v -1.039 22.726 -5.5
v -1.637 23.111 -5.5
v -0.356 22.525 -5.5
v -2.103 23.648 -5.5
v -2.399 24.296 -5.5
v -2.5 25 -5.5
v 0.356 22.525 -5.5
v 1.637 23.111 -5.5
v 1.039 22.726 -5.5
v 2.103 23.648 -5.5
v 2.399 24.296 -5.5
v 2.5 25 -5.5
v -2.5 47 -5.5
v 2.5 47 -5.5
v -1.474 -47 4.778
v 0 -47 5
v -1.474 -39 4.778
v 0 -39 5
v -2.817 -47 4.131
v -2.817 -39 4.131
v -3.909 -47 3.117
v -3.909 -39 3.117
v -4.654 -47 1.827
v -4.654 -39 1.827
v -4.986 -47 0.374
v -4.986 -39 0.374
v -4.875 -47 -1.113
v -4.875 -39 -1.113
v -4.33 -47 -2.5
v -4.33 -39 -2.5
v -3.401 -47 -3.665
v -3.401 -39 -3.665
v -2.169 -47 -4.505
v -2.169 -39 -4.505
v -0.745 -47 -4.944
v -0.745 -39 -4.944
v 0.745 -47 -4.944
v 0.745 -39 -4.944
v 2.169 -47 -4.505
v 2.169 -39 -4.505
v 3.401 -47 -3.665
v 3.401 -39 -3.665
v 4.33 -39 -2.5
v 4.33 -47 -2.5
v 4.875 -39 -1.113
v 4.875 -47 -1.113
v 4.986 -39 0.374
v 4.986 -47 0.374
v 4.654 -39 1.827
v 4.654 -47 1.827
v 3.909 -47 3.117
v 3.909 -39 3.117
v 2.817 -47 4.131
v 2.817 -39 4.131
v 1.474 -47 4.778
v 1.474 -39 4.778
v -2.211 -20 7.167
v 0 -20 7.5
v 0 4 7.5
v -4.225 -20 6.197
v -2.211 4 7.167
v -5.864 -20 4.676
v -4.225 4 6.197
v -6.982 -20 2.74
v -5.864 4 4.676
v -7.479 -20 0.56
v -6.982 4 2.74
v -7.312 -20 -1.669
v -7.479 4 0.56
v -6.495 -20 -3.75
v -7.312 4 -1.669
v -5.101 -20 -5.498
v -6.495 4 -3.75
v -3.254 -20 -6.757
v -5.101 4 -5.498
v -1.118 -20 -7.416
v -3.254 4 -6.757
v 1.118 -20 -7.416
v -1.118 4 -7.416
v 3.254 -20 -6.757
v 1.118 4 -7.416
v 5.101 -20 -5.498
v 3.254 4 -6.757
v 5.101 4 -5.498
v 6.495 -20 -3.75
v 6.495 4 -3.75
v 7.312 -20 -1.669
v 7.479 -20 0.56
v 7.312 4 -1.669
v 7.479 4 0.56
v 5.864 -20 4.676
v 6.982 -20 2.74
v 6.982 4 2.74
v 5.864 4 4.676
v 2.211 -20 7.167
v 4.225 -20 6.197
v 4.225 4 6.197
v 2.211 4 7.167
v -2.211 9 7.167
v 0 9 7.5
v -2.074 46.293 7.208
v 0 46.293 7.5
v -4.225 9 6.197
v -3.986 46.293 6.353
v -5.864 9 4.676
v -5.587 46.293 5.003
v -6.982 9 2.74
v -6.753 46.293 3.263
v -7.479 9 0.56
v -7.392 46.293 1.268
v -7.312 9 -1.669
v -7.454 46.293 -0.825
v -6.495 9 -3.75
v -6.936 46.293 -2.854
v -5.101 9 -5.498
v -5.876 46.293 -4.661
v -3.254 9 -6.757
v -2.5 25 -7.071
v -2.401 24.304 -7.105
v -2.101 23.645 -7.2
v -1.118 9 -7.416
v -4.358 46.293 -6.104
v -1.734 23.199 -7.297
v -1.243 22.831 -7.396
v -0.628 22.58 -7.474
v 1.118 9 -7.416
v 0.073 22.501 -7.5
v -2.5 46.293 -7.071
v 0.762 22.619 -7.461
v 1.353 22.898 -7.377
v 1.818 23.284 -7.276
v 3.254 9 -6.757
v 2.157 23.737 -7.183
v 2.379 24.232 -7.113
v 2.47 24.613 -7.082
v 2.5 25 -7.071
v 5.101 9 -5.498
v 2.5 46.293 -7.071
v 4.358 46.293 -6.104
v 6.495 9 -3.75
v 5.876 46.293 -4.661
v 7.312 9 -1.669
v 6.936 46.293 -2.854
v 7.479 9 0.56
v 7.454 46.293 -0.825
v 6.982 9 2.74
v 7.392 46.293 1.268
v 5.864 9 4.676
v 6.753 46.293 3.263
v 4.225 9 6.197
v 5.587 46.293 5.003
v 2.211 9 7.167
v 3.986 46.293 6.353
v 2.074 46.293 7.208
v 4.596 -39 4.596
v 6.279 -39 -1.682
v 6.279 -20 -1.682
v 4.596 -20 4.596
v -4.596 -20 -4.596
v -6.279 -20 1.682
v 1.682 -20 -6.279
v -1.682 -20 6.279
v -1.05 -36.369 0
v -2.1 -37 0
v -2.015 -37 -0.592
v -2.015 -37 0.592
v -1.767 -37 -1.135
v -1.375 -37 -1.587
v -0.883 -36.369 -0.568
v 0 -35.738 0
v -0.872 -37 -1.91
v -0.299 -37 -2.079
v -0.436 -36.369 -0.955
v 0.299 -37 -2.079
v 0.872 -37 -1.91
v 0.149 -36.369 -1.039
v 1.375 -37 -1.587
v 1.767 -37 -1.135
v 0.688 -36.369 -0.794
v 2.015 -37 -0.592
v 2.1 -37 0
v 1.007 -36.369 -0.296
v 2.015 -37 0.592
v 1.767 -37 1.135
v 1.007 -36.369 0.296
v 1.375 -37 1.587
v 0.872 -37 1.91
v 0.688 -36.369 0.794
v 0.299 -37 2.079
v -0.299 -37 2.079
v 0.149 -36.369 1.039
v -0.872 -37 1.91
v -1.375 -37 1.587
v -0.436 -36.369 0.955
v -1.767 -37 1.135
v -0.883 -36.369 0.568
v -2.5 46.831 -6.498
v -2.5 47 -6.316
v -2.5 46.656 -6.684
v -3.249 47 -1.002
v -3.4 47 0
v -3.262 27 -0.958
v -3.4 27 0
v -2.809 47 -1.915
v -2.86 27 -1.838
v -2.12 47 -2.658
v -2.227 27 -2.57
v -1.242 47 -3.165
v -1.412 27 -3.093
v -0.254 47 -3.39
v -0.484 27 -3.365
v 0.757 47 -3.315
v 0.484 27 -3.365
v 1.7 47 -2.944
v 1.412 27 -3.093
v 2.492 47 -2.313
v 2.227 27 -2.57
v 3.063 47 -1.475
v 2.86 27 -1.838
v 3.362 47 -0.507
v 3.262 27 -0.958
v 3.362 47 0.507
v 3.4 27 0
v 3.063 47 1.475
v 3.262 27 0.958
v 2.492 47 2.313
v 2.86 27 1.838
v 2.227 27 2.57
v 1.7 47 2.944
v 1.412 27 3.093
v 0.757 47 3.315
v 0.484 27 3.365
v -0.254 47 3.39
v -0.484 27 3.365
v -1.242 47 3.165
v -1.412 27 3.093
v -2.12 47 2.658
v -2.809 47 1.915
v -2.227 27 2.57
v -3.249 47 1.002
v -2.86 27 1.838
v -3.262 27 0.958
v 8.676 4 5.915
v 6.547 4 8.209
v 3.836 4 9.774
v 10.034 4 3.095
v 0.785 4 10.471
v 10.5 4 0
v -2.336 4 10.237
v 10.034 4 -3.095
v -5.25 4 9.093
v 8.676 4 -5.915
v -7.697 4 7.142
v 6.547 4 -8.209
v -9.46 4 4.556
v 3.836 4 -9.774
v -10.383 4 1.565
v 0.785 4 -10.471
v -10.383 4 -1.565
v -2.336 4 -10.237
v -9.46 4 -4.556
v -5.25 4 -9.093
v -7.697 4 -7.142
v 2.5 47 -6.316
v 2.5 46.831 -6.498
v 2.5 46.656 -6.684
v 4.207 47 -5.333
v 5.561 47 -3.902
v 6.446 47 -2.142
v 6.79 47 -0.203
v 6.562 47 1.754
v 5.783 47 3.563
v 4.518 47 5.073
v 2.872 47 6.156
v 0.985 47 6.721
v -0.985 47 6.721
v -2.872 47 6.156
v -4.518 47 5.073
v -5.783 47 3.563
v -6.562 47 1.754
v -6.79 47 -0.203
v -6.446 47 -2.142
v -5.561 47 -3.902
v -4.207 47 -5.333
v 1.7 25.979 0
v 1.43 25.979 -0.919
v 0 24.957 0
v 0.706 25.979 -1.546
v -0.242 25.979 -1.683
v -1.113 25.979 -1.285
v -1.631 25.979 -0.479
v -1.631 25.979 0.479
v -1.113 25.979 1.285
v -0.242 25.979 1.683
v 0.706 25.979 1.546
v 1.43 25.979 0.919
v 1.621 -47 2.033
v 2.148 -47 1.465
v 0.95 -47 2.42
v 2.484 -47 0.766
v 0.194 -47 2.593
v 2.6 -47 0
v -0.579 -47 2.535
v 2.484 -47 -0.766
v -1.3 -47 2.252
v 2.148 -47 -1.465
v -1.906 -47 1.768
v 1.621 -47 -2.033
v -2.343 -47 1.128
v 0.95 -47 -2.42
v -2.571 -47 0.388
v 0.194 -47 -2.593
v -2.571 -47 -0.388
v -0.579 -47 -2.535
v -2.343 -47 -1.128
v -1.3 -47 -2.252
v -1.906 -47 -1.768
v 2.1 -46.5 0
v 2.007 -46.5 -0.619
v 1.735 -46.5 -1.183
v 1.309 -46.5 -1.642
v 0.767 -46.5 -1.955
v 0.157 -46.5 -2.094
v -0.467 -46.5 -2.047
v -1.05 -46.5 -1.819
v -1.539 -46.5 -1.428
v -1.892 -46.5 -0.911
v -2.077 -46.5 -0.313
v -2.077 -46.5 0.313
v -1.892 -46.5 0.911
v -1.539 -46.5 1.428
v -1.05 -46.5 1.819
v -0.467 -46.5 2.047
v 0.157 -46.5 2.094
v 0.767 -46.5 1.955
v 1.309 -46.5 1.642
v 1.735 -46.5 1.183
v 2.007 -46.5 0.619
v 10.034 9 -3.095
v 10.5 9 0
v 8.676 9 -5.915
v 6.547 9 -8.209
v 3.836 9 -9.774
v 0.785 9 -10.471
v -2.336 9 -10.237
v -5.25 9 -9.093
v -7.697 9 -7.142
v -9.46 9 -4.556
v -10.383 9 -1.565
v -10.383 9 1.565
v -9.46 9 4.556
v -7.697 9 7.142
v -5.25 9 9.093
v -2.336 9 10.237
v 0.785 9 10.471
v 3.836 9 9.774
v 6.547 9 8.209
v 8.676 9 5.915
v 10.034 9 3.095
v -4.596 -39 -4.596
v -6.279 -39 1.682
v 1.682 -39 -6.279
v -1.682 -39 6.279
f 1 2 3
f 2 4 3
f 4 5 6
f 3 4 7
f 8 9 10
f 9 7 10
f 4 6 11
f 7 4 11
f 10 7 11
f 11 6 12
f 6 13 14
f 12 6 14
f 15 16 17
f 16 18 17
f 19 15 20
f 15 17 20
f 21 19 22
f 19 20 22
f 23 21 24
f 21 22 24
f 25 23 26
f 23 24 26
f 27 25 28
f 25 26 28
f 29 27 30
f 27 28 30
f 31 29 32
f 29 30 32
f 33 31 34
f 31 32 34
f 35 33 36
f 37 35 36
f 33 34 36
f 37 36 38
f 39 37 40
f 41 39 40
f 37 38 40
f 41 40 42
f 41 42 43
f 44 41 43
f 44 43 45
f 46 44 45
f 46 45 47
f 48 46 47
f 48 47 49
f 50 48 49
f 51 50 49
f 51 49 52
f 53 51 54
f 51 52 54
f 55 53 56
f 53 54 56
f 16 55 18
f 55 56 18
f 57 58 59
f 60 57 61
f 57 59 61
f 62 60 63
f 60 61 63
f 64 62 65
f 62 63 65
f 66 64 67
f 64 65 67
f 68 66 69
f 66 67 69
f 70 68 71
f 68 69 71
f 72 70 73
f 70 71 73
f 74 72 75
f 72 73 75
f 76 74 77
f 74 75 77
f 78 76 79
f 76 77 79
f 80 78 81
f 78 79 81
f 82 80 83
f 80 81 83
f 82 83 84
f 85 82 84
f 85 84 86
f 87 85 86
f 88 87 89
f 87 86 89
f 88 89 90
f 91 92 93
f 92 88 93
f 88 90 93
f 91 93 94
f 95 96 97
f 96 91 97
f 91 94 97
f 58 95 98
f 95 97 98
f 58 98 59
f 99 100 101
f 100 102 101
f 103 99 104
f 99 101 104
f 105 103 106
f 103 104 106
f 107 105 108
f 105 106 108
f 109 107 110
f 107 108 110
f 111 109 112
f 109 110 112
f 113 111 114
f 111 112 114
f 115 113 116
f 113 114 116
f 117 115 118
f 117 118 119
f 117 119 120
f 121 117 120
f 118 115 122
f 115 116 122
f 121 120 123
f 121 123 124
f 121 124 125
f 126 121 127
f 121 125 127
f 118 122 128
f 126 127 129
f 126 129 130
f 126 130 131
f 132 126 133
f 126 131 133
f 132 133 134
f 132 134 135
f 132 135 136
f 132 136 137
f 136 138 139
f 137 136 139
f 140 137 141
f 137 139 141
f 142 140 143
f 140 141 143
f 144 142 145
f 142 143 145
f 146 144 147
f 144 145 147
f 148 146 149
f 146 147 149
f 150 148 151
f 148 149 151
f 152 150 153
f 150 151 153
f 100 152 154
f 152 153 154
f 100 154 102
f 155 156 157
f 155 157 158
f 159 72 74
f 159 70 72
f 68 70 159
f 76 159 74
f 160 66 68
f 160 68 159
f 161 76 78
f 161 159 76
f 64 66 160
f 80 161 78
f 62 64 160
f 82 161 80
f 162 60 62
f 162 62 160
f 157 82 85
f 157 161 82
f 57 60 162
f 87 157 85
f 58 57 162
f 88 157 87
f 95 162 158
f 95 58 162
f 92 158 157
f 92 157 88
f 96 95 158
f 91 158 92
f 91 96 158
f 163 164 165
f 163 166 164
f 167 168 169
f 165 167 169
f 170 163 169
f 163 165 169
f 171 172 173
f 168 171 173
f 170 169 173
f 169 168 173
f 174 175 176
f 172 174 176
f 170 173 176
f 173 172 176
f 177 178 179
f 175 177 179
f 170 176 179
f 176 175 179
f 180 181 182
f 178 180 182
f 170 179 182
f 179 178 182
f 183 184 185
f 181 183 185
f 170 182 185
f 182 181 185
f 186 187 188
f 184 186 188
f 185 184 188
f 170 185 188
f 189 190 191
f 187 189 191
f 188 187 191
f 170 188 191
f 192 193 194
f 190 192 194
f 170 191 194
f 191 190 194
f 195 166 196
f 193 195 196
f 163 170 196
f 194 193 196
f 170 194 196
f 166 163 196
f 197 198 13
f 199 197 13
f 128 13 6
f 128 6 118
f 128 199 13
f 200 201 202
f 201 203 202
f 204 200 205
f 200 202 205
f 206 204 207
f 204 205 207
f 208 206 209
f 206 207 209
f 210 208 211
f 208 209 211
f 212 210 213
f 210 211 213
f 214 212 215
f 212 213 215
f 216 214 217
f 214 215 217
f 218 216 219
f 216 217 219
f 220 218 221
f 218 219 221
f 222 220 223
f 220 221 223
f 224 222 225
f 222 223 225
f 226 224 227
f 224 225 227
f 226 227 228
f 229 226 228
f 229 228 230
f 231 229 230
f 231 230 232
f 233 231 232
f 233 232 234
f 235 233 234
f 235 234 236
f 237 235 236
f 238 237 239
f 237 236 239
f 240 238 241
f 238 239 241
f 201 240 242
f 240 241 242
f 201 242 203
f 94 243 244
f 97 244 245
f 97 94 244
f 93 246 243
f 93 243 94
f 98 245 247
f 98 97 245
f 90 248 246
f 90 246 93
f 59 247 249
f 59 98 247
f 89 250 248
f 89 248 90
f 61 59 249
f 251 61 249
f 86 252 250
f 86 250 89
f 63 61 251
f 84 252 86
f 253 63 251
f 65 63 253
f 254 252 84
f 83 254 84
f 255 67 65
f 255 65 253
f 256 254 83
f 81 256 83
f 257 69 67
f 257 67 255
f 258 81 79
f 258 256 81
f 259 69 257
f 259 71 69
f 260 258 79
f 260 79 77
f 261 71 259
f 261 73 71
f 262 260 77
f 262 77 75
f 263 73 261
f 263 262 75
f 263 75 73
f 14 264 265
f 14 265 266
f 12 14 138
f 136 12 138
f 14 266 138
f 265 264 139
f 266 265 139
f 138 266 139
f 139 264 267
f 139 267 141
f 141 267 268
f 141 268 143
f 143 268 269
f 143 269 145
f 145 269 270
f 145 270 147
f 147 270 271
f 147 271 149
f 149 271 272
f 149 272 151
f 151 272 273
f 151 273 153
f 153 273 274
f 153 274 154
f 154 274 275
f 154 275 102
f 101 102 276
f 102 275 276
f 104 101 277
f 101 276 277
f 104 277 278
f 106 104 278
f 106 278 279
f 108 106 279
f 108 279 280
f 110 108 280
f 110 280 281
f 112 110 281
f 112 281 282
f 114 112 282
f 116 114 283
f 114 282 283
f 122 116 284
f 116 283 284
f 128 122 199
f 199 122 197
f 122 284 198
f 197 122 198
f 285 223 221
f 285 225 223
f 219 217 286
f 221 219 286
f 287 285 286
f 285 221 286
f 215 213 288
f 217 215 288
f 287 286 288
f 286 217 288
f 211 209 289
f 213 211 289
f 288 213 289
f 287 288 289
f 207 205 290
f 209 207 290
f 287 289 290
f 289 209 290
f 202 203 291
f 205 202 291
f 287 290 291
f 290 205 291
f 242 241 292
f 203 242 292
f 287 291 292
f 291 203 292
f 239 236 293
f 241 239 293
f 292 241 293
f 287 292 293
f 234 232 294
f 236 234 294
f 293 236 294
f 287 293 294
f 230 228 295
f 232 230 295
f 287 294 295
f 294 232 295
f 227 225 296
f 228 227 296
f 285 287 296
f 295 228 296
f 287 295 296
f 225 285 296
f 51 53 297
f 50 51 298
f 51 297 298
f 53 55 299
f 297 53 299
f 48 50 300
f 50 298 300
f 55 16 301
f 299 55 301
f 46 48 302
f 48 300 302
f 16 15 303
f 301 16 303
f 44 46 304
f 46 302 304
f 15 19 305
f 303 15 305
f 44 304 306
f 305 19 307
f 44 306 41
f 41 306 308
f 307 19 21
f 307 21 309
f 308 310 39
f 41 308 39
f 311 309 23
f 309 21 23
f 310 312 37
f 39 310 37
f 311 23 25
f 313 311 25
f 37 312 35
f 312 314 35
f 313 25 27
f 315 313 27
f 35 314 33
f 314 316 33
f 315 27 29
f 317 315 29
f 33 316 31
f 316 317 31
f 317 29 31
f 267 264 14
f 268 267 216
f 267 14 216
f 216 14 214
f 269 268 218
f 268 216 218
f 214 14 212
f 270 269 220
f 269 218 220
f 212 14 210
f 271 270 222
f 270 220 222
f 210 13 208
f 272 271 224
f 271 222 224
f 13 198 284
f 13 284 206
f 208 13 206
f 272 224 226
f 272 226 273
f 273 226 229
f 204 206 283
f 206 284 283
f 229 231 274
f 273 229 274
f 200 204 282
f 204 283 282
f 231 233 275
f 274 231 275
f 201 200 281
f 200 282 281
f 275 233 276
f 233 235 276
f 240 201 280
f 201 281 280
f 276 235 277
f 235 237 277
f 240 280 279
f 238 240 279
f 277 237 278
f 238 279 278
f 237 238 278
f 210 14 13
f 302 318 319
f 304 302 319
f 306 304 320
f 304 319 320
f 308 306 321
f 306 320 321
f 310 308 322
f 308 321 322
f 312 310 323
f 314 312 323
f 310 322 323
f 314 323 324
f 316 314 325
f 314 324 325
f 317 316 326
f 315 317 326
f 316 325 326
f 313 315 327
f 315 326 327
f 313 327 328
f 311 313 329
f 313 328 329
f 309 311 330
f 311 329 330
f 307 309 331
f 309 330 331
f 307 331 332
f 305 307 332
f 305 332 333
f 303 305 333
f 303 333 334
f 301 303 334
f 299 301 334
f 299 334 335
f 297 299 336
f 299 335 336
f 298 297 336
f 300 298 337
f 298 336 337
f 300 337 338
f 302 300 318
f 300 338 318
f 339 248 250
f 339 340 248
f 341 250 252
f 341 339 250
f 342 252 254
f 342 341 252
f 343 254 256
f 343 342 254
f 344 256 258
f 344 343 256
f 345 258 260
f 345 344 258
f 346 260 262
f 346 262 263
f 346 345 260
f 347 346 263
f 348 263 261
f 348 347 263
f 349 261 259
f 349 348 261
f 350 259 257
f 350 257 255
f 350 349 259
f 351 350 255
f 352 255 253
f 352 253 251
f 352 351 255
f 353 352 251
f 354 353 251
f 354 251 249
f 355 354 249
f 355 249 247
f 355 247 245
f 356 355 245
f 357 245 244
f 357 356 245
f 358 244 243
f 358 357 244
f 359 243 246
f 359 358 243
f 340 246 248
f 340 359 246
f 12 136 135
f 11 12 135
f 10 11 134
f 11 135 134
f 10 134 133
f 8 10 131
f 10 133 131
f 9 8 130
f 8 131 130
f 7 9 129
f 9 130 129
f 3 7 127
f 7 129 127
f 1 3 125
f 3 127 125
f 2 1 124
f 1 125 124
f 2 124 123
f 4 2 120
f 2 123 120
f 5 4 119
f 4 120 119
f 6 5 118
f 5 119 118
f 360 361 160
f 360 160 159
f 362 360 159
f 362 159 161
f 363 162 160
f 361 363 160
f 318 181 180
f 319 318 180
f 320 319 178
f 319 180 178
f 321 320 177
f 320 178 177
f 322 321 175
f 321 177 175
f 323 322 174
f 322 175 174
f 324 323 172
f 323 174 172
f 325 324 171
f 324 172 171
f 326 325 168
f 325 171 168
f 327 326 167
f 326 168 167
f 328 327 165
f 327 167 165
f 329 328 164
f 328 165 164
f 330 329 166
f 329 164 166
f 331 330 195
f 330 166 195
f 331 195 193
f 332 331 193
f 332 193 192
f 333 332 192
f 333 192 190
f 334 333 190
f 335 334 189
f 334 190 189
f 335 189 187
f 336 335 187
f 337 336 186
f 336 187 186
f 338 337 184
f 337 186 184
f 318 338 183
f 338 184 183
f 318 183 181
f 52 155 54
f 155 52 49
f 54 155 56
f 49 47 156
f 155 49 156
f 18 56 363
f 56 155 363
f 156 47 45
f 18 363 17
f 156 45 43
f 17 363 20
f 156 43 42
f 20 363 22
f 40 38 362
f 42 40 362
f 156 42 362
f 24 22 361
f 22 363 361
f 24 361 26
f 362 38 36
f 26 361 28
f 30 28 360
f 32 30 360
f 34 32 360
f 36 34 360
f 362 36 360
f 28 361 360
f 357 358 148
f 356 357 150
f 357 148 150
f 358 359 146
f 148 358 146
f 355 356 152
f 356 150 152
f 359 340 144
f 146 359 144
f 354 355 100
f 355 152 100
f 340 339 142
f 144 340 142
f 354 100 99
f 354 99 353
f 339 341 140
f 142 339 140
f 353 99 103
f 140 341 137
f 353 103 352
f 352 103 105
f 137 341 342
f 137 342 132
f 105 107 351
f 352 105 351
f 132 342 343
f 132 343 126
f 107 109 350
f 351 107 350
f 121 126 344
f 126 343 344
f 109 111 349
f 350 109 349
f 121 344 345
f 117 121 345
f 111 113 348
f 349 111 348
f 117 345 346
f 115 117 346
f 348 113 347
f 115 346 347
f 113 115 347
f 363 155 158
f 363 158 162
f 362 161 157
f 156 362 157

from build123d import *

# Parameters (mm, degrees)
ESBO_O2_W                                      = 5
ESBO_O2_H                                      = 6
CORTE_EXTRUS_O1_DEPTH                          = 22
CORTE_EXTRUS_O2_DEPTH                          = 2
ESBO_O5_R                                      = 12.651043405
CORTE_EXTRUS_O8_DEPTH                          = 19
BROCA_DE_ROSQUEAR_PARA_TARRAXA_DE_M5X0_8_D     = 4.2
BROCA_DE_ROSQUEAR_PARA_TARRAXA_DE_M5X0_8_DEPTH = 10
BROCA_DE_ROSQUEAR_PARA_TARRAXA_DE_M5X0_8_TIP   = 1.2618073
CHANFRO1_SIZE                                  = 0.5
ESBO_O10_W                                     = 3
ESBO_O10_H                                     = 5
BROCA_DE_ROSQUEAR_PARA_TARRAXA_DE_M81_D        = 6.8
BROCA_DE_ROSQUEAR_PARA_TARRAXA_DE_M81_DEPTH    = 20
BROCA_DE_ROSQUEAR_PARA_TARRAXA_DE_M81_TIP      = 2.042926105


with BuildPart() as part:
    # Esboço1 → Revolução1 (revolve)
    with BuildSketch(Plane.XY, mode=Mode.PRIVATE) as revolu_o1_sk:
        Polygon((6.792893219, 47), (4, 47), (0, 47), (0, 23), (0, -47), (5, -47), (5, -39), (7.5, -39), (7.5, -11), (7.5, 46.292893219), align=None)
    revolve(revolu_o1_sk.sketch.rotate(Axis((0, -47, 0), (0, -1, 0)), 90), axis=Axis((0, -47, 0), (0, -1, 0)))

    # Esboço2 → Corte-extrusão1 (cut)
    with BuildSketch(Plane(origin=(0, 47, 0), x_dir=(1, 0, 0), z_dir=(0, 1, 0))):
        with Locations((0, 8.5)):
            Rectangle(ESBO_O2_W, ESBO_O2_H)
    extrude(amount=-CORTE_EXTRUS_O1_DEPTH, mode=Mode.SUBTRACT)

    # Esboço3 → Corte-extrusão2 (cut)
    with BuildSketch(Plane(origin=(0, 25, -7.5), x_dir=(-1, 0, 0), z_dir=(0, 0, -1))):
        with BuildLine():
            Line((2.5, 0), (-2.5, 0))
            ThreePointArc((-2.5, 0), (0, -2.5), (2.5, 0))
        make_face()
    extrude(amount=-CORTE_EXTRUS_O2_DEPTH, mode=Mode.SUBTRACT)

    # Esboço5 → Corte-extrusão8 (cut)
    with BuildSketch(Plane.XZ.offset(39)):
        Circle(ESBO_O5_R)
        Polygon((-4.596194078, -4.596194078), (1.682323793, -6.278517871), (6.278517871, -1.682323793), (4.596194078, 4.596194078), (-1.682323793, 6.278517871), (-6.278517871, 1.682323793), align=None, mode=Mode.SUBTRACT)
    extrude(amount=-CORTE_EXTRUS_O8_DEPTH, mode=Mode.SUBTRACT)

    # Broca de rosquear para tarraxa de M5x0.81
    with Locations(Plane(origin=(0, -47, 0), x_dir=(-1, 0, 0), z_dir=(0, -1, 0))):
        with Locations((0, 0)):
            Hole(BROCA_DE_ROSQUEAR_PARA_TARRAXA_DE_M5X0_8_D / 2, depth=BROCA_DE_ROSQUEAR_PARA_TARRAXA_DE_M5X0_8_DEPTH)
            with Locations((0, 0, -(BROCA_DE_ROSQUEAR_PARA_TARRAXA_DE_M5X0_8_DEPTH + BROCA_DE_ROSQUEAR_PARA_TARRAXA_DE_M5X0_8_TIP / 2))):  # 118° drill point
                Cone(0, BROCA_DE_ROSQUEAR_PARA_TARRAXA_DE_M5X0_8_D / 2, BROCA_DE_ROSQUEAR_PARA_TARRAXA_DE_M5X0_8_TIP, mode=Mode.SUBTRACT)

    # Chanfro1
    chanfro1_edges = [part.edges().sort_by_distance(p)[0] for p in [
        (-2.1, -47, 0),
    ]]
    chamfer(chanfro1_edges, length=CHANFRO1_SIZE)

    # Esboço10 → Revolução2 (revolve)
    with BuildSketch(Plane(origin=(0, 0, 0), x_dir=(-0.965925826289067, 0, 0.2588190451025257), z_dir=(-0.2588190451025257, 0, -0.965925826289067)), mode=Mode.PRIVATE) as revolu_o2_sk:
        with Locations((9, 6.5)):
            Rectangle(ESBO_O10_W, ESBO_O10_H)
    revolve(revolu_o2_sk.sketch.rotate(Axis((0, -20, 0), (0, 1, 0)), 165), axis=Axis((0, -20, 0), (0, 1, 0)))

    # Broca de rosquear para tarraxa de M81
    with Locations(Plane(origin=(0, 47, 0), x_dir=(1, 0, 0), z_dir=(0, 1, 0))):
        with Locations((0, 0)):
            Hole(BROCA_DE_ROSQUEAR_PARA_TARRAXA_DE_M81_D / 2, depth=BROCA_DE_ROSQUEAR_PARA_TARRAXA_DE_M81_DEPTH)
            with Locations((0, 0, -(BROCA_DE_ROSQUEAR_PARA_TARRAXA_DE_M81_DEPTH + BROCA_DE_ROSQUEAR_PARA_TARRAXA_DE_M81_TIP / 2))):  # 118° drill point
                Cone(0, BROCA_DE_ROSQUEAR_PARA_TARRAXA_DE_M81_D / 2, BROCA_DE_ROSQUEAR_PARA_TARRAXA_DE_M81_TIP, mode=Mode.SUBTRACT)


solid = part.part
